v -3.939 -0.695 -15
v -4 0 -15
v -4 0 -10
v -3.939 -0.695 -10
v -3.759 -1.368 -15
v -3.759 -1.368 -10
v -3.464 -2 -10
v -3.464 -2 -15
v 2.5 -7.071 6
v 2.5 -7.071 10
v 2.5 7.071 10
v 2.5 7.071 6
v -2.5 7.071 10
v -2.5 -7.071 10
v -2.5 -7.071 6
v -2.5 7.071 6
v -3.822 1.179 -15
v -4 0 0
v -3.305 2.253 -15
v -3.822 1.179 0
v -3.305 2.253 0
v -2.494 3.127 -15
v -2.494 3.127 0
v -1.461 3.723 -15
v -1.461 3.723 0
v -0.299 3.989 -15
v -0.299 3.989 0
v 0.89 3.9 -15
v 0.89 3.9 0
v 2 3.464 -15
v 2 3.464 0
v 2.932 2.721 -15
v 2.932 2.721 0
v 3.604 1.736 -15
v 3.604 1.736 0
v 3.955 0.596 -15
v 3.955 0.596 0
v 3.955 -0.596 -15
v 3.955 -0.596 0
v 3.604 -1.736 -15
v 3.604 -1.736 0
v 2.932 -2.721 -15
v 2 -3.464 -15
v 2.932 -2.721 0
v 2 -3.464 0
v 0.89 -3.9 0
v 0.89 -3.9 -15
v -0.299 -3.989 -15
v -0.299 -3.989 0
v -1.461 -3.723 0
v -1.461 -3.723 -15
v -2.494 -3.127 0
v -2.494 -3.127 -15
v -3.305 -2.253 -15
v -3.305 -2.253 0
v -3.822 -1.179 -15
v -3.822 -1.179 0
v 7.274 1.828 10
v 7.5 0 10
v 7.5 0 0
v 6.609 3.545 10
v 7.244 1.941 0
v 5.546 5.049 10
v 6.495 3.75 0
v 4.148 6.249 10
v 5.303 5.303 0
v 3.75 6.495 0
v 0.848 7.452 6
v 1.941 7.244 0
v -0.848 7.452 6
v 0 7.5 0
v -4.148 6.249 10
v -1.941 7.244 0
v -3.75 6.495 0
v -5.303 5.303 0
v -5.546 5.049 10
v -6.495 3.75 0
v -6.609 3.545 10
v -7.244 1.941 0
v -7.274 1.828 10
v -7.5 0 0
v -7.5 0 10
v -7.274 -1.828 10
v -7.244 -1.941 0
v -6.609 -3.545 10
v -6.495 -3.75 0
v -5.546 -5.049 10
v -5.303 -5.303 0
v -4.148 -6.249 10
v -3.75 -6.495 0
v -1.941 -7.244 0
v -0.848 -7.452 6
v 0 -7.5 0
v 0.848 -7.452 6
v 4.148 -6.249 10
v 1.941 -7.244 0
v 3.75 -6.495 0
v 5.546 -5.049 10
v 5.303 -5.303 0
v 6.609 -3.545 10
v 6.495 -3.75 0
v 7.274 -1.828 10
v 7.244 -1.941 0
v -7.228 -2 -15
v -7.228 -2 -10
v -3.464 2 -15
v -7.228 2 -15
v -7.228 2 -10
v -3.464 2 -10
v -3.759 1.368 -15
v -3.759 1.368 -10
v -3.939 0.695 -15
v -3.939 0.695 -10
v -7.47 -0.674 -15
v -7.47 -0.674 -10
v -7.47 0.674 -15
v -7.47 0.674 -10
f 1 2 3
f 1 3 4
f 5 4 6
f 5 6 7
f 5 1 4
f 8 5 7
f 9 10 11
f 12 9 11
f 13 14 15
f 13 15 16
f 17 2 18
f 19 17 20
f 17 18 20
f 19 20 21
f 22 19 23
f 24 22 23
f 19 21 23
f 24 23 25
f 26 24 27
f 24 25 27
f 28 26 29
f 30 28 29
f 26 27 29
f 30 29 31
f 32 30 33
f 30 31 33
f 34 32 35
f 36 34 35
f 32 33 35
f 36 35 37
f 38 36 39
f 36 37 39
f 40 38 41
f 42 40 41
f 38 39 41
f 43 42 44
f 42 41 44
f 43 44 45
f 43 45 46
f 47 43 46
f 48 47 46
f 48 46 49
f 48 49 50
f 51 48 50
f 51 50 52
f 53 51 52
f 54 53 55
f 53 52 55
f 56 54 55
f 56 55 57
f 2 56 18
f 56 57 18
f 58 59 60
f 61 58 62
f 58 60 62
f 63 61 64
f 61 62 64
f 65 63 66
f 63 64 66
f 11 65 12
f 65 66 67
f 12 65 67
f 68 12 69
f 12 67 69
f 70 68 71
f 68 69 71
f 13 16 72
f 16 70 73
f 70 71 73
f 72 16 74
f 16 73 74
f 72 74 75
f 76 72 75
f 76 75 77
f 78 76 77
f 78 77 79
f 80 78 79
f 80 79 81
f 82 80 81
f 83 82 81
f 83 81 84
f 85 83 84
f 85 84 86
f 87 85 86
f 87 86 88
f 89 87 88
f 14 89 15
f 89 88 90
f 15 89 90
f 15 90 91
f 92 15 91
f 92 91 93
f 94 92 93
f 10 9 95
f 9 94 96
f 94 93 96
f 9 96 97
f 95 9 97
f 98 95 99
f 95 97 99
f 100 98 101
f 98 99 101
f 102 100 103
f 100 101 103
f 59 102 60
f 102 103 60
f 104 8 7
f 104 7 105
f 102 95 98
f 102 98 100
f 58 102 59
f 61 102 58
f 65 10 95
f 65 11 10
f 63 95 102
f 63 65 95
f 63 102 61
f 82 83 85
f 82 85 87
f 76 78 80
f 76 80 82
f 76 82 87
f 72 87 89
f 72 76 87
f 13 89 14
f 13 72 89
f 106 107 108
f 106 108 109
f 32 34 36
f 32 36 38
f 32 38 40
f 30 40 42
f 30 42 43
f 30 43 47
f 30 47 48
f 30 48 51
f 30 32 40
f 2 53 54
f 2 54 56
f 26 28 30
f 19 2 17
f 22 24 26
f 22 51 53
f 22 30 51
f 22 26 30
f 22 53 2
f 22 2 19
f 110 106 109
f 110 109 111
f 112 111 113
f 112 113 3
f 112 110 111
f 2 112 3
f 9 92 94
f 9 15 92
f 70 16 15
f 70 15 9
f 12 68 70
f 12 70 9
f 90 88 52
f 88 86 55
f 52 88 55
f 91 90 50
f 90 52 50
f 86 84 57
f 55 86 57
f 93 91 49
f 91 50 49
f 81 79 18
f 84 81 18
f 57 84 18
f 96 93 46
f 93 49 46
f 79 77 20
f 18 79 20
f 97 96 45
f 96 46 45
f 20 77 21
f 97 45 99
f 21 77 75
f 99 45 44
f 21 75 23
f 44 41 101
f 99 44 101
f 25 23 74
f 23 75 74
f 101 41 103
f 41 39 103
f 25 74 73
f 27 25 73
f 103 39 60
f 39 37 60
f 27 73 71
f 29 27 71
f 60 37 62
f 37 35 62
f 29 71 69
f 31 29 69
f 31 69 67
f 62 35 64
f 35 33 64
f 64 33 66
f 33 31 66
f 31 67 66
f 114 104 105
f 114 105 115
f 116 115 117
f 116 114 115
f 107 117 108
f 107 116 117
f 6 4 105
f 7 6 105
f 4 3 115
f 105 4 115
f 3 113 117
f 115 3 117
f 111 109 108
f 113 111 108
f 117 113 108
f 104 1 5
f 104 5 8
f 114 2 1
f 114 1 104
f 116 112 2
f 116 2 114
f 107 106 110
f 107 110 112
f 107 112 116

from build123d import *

# Parameters (mm, degrees)
SKETCH1_R           = 7.5
BOSS_EXTRUDE1_DEPTH = 10
SKETCH2_R           = 4
BOSS_EXTRUDE2_DEPTH = 15
BOSS_EXTRUDE3_DEPTH = 5
SKETCH4_W           = 5
SKETCH4_H           = 49.018189619
CUT_EXTRUDE1_DEPTH  = 4


with BuildPart() as part:
    # Sketch1 → Boss-Extrude1 (new body)
    with BuildSketch(Plane.XY):
        Circle(SKETCH1_R)
    extrude(amount=BOSS_EXTRUDE1_DEPTH)

    # Sketch2 → Boss-Extrude2 (add)
    with BuildSketch(Plane(origin=(0, 0, 0), x_dir=(-1, 0, 0), z_dir=(0, 0, -1))):
        Circle(SKETCH2_R)
    extrude(amount=BOSS_EXTRUDE2_DEPTH)

    # Sketch4 → Cut-Extrude1 (cut)
    with BuildSketch(Plane.XY.offset(10)):
        with Locations((0, 10.94373623)):
            Rectangle(SKETCH4_W, SKETCH4_H)
    extrude(amount=-CUT_EXTRUDE1_DEPTH, mode=Mode.SUBTRACT)


with BuildPart() as body_2:
    # Sketch3 → Boss-Extrude3 (new body)
    with BuildSketch(Plane(origin=(0, 0, -15), x_dir=(-1, 0, 0), z_dir=(0, 0, -1))):
        with BuildLine():
            Line((7.228416147, 2), (3.464101615, 2))
            ThreePointArc((3.464101615, 2), (3.863703305, 1.03527618), (4, 0))
            ThreePointArc((4, 0), (3.863703305, -1.03527618), (3.464101615, -2))
            Line((3.464101615, -2), (7.228416147, -2))
            ThreePointArc((7.228416147, -2), (7.5, 0), (7.228416147, 2))
        make_face()
    extrude(amount=-BOSS_EXTRUDE3_DEPTH)


solid = Compound([part.part, body_2.part])
